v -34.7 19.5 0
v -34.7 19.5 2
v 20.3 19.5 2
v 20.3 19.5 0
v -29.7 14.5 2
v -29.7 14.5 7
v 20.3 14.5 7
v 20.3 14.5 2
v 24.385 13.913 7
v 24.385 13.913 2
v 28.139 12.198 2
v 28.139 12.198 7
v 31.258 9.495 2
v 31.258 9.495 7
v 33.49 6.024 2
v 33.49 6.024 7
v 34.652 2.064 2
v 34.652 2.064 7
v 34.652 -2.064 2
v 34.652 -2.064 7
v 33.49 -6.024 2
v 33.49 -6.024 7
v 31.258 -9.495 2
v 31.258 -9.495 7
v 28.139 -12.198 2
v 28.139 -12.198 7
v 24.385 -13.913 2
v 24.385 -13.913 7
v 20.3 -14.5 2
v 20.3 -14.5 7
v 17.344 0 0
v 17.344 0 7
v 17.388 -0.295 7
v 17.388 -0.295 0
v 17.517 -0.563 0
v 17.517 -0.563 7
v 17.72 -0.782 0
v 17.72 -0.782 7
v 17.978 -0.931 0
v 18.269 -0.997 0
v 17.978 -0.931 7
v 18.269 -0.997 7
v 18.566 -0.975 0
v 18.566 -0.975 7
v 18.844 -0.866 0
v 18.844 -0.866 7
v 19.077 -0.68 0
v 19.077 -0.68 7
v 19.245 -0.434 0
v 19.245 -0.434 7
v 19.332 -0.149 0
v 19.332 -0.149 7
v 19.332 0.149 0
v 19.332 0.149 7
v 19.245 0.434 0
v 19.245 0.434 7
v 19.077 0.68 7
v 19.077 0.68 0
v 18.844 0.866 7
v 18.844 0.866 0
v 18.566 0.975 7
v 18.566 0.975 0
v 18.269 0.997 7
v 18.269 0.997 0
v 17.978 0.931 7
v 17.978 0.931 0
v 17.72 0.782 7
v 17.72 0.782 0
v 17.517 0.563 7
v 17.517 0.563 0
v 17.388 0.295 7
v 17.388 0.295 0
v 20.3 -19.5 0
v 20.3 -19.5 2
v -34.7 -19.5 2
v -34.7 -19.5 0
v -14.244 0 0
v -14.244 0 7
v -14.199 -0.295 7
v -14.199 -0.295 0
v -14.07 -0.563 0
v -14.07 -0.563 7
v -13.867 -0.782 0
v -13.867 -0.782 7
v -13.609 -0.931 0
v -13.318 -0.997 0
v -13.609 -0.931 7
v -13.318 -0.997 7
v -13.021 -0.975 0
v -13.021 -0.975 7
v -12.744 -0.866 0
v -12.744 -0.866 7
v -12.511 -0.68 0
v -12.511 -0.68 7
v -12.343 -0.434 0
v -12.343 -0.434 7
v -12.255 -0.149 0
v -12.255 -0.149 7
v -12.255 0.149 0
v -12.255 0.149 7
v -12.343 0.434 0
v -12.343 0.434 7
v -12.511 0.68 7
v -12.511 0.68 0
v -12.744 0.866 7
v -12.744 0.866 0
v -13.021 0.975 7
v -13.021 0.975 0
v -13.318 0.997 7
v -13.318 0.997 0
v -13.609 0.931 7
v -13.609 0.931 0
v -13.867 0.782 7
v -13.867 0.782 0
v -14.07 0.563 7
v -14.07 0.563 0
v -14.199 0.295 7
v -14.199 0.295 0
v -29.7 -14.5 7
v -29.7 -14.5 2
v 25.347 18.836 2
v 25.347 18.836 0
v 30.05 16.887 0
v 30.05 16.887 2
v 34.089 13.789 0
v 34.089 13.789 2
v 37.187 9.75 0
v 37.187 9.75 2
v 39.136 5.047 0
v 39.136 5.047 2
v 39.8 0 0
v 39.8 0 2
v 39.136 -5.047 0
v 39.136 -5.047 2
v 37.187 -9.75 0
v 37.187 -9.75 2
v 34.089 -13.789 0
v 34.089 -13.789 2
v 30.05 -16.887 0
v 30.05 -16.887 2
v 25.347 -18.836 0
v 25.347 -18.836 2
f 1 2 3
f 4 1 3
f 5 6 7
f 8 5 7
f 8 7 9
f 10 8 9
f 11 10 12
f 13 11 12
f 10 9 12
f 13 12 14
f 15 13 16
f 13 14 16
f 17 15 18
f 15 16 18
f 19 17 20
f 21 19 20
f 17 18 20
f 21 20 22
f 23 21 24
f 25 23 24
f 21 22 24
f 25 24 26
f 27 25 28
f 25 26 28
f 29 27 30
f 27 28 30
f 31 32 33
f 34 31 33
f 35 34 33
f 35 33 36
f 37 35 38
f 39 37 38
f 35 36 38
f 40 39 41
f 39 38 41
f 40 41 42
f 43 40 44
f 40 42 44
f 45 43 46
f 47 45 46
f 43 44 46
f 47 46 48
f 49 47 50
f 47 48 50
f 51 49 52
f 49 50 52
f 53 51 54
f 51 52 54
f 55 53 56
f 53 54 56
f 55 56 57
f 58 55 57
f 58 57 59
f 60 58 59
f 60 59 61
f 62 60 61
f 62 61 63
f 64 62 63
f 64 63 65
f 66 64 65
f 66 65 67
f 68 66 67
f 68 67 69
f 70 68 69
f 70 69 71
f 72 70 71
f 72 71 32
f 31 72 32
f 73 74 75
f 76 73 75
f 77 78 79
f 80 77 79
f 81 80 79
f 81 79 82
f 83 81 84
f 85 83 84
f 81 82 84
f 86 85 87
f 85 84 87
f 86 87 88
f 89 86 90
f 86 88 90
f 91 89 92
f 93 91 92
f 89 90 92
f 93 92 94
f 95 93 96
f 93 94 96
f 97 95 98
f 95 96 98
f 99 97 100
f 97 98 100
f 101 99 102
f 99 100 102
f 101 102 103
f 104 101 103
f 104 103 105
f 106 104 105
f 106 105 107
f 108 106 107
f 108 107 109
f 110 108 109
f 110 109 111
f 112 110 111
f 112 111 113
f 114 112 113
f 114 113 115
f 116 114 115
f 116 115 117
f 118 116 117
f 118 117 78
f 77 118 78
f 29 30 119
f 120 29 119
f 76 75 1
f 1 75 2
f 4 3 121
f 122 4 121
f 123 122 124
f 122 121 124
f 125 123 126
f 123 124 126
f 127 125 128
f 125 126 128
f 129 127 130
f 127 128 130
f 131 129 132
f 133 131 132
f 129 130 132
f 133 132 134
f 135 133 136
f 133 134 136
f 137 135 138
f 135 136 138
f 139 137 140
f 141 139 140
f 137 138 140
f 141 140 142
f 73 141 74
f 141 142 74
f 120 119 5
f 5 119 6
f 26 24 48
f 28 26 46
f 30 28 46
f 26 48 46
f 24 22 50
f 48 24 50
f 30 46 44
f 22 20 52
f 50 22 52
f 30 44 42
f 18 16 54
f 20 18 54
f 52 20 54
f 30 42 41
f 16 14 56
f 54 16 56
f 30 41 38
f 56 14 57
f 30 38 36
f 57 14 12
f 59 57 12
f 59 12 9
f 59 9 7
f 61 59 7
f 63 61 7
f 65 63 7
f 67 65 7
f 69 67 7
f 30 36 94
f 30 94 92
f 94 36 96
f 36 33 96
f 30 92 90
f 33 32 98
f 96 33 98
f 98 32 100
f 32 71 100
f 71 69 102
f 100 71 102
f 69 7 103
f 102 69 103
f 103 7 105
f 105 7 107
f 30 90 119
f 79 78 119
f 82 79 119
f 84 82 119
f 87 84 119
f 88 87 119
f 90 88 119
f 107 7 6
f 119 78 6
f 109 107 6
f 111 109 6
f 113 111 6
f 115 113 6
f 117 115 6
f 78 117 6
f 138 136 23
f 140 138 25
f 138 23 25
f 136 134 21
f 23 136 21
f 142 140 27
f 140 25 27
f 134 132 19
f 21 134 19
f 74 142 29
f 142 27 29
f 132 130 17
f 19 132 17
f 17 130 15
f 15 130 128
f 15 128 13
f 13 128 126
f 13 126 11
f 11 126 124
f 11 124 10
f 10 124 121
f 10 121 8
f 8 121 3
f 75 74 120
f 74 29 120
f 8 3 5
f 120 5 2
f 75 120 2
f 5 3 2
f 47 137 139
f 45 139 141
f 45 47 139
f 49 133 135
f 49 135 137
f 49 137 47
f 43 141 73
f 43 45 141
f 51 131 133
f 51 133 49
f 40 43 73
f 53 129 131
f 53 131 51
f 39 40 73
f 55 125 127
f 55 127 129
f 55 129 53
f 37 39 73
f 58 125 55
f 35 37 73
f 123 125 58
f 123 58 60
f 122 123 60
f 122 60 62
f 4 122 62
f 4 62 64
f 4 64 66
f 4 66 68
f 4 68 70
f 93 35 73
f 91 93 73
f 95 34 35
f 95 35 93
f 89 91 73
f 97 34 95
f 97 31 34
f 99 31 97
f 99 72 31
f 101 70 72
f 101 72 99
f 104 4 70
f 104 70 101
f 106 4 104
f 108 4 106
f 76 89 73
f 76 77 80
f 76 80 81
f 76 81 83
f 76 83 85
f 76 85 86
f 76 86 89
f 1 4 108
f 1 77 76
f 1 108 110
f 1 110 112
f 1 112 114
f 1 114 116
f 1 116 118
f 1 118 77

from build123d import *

# Parameters (mm, degrees)
F1_DEPTH = 5
F3_DEPTH = 2
F4_R     = 1
F5_DEPTH = 25
F6_ANGLE = 180


with BuildPart() as f1:
    # F0 (on Top) → F1 (new body)
    with BuildSketch(Plane.XY):
        with BuildLine():
            ThreePointArc((-25, 14.5), (-39.5, 0), (-25, -14.5))
            Line((-25, -14.5), (25, -14.5))
            Line((25, -14.5), (25, 14.5))
            Line((25, 14.5), (-25, 14.5))
        make_face()
    extrude(amount=F1_DEPTH)

    # F2 (on face) → F3 (join)
    with BuildSketch(Plane.XY.offset(5)):
        with BuildLine():
            Line((-25, -19.5), (30, -19.5))
            Line((30, -19.5), (30, 19.5))
            Line((30, 19.5), (-25, 19.5))
            ThreePointArc((-25, 19.5), (-44.5, 0), (-25, -19.5))
        make_face()
    extrude(amount=F3_DEPTH)

    # F4 (on face) → F5 (cut)
    with BuildSketch(Plane(origin=(0, 0, 0), x_dir=(1, 0, 0), z_dir=(0, 0, -1))):
        with Locations((8.543553, 0)):
            Circle(F4_R)
        with Locations((-23.043553, 0)):
            Circle(F4_R)
    extrude(amount=-F5_DEPTH, mode=Mode.SUBTRACT)


with BuildPart() as f1_1:
    # F6: moved
    add(f1.part.rotate(Axis((30, 0, 7), (0, 1, 0)), F6_ANGLE))


with BuildPart() as f1_2:
    # F7: moved
    add(f1_1.part.moved(Location((-64.7, 0, -7))))


solid = f1_2.part
